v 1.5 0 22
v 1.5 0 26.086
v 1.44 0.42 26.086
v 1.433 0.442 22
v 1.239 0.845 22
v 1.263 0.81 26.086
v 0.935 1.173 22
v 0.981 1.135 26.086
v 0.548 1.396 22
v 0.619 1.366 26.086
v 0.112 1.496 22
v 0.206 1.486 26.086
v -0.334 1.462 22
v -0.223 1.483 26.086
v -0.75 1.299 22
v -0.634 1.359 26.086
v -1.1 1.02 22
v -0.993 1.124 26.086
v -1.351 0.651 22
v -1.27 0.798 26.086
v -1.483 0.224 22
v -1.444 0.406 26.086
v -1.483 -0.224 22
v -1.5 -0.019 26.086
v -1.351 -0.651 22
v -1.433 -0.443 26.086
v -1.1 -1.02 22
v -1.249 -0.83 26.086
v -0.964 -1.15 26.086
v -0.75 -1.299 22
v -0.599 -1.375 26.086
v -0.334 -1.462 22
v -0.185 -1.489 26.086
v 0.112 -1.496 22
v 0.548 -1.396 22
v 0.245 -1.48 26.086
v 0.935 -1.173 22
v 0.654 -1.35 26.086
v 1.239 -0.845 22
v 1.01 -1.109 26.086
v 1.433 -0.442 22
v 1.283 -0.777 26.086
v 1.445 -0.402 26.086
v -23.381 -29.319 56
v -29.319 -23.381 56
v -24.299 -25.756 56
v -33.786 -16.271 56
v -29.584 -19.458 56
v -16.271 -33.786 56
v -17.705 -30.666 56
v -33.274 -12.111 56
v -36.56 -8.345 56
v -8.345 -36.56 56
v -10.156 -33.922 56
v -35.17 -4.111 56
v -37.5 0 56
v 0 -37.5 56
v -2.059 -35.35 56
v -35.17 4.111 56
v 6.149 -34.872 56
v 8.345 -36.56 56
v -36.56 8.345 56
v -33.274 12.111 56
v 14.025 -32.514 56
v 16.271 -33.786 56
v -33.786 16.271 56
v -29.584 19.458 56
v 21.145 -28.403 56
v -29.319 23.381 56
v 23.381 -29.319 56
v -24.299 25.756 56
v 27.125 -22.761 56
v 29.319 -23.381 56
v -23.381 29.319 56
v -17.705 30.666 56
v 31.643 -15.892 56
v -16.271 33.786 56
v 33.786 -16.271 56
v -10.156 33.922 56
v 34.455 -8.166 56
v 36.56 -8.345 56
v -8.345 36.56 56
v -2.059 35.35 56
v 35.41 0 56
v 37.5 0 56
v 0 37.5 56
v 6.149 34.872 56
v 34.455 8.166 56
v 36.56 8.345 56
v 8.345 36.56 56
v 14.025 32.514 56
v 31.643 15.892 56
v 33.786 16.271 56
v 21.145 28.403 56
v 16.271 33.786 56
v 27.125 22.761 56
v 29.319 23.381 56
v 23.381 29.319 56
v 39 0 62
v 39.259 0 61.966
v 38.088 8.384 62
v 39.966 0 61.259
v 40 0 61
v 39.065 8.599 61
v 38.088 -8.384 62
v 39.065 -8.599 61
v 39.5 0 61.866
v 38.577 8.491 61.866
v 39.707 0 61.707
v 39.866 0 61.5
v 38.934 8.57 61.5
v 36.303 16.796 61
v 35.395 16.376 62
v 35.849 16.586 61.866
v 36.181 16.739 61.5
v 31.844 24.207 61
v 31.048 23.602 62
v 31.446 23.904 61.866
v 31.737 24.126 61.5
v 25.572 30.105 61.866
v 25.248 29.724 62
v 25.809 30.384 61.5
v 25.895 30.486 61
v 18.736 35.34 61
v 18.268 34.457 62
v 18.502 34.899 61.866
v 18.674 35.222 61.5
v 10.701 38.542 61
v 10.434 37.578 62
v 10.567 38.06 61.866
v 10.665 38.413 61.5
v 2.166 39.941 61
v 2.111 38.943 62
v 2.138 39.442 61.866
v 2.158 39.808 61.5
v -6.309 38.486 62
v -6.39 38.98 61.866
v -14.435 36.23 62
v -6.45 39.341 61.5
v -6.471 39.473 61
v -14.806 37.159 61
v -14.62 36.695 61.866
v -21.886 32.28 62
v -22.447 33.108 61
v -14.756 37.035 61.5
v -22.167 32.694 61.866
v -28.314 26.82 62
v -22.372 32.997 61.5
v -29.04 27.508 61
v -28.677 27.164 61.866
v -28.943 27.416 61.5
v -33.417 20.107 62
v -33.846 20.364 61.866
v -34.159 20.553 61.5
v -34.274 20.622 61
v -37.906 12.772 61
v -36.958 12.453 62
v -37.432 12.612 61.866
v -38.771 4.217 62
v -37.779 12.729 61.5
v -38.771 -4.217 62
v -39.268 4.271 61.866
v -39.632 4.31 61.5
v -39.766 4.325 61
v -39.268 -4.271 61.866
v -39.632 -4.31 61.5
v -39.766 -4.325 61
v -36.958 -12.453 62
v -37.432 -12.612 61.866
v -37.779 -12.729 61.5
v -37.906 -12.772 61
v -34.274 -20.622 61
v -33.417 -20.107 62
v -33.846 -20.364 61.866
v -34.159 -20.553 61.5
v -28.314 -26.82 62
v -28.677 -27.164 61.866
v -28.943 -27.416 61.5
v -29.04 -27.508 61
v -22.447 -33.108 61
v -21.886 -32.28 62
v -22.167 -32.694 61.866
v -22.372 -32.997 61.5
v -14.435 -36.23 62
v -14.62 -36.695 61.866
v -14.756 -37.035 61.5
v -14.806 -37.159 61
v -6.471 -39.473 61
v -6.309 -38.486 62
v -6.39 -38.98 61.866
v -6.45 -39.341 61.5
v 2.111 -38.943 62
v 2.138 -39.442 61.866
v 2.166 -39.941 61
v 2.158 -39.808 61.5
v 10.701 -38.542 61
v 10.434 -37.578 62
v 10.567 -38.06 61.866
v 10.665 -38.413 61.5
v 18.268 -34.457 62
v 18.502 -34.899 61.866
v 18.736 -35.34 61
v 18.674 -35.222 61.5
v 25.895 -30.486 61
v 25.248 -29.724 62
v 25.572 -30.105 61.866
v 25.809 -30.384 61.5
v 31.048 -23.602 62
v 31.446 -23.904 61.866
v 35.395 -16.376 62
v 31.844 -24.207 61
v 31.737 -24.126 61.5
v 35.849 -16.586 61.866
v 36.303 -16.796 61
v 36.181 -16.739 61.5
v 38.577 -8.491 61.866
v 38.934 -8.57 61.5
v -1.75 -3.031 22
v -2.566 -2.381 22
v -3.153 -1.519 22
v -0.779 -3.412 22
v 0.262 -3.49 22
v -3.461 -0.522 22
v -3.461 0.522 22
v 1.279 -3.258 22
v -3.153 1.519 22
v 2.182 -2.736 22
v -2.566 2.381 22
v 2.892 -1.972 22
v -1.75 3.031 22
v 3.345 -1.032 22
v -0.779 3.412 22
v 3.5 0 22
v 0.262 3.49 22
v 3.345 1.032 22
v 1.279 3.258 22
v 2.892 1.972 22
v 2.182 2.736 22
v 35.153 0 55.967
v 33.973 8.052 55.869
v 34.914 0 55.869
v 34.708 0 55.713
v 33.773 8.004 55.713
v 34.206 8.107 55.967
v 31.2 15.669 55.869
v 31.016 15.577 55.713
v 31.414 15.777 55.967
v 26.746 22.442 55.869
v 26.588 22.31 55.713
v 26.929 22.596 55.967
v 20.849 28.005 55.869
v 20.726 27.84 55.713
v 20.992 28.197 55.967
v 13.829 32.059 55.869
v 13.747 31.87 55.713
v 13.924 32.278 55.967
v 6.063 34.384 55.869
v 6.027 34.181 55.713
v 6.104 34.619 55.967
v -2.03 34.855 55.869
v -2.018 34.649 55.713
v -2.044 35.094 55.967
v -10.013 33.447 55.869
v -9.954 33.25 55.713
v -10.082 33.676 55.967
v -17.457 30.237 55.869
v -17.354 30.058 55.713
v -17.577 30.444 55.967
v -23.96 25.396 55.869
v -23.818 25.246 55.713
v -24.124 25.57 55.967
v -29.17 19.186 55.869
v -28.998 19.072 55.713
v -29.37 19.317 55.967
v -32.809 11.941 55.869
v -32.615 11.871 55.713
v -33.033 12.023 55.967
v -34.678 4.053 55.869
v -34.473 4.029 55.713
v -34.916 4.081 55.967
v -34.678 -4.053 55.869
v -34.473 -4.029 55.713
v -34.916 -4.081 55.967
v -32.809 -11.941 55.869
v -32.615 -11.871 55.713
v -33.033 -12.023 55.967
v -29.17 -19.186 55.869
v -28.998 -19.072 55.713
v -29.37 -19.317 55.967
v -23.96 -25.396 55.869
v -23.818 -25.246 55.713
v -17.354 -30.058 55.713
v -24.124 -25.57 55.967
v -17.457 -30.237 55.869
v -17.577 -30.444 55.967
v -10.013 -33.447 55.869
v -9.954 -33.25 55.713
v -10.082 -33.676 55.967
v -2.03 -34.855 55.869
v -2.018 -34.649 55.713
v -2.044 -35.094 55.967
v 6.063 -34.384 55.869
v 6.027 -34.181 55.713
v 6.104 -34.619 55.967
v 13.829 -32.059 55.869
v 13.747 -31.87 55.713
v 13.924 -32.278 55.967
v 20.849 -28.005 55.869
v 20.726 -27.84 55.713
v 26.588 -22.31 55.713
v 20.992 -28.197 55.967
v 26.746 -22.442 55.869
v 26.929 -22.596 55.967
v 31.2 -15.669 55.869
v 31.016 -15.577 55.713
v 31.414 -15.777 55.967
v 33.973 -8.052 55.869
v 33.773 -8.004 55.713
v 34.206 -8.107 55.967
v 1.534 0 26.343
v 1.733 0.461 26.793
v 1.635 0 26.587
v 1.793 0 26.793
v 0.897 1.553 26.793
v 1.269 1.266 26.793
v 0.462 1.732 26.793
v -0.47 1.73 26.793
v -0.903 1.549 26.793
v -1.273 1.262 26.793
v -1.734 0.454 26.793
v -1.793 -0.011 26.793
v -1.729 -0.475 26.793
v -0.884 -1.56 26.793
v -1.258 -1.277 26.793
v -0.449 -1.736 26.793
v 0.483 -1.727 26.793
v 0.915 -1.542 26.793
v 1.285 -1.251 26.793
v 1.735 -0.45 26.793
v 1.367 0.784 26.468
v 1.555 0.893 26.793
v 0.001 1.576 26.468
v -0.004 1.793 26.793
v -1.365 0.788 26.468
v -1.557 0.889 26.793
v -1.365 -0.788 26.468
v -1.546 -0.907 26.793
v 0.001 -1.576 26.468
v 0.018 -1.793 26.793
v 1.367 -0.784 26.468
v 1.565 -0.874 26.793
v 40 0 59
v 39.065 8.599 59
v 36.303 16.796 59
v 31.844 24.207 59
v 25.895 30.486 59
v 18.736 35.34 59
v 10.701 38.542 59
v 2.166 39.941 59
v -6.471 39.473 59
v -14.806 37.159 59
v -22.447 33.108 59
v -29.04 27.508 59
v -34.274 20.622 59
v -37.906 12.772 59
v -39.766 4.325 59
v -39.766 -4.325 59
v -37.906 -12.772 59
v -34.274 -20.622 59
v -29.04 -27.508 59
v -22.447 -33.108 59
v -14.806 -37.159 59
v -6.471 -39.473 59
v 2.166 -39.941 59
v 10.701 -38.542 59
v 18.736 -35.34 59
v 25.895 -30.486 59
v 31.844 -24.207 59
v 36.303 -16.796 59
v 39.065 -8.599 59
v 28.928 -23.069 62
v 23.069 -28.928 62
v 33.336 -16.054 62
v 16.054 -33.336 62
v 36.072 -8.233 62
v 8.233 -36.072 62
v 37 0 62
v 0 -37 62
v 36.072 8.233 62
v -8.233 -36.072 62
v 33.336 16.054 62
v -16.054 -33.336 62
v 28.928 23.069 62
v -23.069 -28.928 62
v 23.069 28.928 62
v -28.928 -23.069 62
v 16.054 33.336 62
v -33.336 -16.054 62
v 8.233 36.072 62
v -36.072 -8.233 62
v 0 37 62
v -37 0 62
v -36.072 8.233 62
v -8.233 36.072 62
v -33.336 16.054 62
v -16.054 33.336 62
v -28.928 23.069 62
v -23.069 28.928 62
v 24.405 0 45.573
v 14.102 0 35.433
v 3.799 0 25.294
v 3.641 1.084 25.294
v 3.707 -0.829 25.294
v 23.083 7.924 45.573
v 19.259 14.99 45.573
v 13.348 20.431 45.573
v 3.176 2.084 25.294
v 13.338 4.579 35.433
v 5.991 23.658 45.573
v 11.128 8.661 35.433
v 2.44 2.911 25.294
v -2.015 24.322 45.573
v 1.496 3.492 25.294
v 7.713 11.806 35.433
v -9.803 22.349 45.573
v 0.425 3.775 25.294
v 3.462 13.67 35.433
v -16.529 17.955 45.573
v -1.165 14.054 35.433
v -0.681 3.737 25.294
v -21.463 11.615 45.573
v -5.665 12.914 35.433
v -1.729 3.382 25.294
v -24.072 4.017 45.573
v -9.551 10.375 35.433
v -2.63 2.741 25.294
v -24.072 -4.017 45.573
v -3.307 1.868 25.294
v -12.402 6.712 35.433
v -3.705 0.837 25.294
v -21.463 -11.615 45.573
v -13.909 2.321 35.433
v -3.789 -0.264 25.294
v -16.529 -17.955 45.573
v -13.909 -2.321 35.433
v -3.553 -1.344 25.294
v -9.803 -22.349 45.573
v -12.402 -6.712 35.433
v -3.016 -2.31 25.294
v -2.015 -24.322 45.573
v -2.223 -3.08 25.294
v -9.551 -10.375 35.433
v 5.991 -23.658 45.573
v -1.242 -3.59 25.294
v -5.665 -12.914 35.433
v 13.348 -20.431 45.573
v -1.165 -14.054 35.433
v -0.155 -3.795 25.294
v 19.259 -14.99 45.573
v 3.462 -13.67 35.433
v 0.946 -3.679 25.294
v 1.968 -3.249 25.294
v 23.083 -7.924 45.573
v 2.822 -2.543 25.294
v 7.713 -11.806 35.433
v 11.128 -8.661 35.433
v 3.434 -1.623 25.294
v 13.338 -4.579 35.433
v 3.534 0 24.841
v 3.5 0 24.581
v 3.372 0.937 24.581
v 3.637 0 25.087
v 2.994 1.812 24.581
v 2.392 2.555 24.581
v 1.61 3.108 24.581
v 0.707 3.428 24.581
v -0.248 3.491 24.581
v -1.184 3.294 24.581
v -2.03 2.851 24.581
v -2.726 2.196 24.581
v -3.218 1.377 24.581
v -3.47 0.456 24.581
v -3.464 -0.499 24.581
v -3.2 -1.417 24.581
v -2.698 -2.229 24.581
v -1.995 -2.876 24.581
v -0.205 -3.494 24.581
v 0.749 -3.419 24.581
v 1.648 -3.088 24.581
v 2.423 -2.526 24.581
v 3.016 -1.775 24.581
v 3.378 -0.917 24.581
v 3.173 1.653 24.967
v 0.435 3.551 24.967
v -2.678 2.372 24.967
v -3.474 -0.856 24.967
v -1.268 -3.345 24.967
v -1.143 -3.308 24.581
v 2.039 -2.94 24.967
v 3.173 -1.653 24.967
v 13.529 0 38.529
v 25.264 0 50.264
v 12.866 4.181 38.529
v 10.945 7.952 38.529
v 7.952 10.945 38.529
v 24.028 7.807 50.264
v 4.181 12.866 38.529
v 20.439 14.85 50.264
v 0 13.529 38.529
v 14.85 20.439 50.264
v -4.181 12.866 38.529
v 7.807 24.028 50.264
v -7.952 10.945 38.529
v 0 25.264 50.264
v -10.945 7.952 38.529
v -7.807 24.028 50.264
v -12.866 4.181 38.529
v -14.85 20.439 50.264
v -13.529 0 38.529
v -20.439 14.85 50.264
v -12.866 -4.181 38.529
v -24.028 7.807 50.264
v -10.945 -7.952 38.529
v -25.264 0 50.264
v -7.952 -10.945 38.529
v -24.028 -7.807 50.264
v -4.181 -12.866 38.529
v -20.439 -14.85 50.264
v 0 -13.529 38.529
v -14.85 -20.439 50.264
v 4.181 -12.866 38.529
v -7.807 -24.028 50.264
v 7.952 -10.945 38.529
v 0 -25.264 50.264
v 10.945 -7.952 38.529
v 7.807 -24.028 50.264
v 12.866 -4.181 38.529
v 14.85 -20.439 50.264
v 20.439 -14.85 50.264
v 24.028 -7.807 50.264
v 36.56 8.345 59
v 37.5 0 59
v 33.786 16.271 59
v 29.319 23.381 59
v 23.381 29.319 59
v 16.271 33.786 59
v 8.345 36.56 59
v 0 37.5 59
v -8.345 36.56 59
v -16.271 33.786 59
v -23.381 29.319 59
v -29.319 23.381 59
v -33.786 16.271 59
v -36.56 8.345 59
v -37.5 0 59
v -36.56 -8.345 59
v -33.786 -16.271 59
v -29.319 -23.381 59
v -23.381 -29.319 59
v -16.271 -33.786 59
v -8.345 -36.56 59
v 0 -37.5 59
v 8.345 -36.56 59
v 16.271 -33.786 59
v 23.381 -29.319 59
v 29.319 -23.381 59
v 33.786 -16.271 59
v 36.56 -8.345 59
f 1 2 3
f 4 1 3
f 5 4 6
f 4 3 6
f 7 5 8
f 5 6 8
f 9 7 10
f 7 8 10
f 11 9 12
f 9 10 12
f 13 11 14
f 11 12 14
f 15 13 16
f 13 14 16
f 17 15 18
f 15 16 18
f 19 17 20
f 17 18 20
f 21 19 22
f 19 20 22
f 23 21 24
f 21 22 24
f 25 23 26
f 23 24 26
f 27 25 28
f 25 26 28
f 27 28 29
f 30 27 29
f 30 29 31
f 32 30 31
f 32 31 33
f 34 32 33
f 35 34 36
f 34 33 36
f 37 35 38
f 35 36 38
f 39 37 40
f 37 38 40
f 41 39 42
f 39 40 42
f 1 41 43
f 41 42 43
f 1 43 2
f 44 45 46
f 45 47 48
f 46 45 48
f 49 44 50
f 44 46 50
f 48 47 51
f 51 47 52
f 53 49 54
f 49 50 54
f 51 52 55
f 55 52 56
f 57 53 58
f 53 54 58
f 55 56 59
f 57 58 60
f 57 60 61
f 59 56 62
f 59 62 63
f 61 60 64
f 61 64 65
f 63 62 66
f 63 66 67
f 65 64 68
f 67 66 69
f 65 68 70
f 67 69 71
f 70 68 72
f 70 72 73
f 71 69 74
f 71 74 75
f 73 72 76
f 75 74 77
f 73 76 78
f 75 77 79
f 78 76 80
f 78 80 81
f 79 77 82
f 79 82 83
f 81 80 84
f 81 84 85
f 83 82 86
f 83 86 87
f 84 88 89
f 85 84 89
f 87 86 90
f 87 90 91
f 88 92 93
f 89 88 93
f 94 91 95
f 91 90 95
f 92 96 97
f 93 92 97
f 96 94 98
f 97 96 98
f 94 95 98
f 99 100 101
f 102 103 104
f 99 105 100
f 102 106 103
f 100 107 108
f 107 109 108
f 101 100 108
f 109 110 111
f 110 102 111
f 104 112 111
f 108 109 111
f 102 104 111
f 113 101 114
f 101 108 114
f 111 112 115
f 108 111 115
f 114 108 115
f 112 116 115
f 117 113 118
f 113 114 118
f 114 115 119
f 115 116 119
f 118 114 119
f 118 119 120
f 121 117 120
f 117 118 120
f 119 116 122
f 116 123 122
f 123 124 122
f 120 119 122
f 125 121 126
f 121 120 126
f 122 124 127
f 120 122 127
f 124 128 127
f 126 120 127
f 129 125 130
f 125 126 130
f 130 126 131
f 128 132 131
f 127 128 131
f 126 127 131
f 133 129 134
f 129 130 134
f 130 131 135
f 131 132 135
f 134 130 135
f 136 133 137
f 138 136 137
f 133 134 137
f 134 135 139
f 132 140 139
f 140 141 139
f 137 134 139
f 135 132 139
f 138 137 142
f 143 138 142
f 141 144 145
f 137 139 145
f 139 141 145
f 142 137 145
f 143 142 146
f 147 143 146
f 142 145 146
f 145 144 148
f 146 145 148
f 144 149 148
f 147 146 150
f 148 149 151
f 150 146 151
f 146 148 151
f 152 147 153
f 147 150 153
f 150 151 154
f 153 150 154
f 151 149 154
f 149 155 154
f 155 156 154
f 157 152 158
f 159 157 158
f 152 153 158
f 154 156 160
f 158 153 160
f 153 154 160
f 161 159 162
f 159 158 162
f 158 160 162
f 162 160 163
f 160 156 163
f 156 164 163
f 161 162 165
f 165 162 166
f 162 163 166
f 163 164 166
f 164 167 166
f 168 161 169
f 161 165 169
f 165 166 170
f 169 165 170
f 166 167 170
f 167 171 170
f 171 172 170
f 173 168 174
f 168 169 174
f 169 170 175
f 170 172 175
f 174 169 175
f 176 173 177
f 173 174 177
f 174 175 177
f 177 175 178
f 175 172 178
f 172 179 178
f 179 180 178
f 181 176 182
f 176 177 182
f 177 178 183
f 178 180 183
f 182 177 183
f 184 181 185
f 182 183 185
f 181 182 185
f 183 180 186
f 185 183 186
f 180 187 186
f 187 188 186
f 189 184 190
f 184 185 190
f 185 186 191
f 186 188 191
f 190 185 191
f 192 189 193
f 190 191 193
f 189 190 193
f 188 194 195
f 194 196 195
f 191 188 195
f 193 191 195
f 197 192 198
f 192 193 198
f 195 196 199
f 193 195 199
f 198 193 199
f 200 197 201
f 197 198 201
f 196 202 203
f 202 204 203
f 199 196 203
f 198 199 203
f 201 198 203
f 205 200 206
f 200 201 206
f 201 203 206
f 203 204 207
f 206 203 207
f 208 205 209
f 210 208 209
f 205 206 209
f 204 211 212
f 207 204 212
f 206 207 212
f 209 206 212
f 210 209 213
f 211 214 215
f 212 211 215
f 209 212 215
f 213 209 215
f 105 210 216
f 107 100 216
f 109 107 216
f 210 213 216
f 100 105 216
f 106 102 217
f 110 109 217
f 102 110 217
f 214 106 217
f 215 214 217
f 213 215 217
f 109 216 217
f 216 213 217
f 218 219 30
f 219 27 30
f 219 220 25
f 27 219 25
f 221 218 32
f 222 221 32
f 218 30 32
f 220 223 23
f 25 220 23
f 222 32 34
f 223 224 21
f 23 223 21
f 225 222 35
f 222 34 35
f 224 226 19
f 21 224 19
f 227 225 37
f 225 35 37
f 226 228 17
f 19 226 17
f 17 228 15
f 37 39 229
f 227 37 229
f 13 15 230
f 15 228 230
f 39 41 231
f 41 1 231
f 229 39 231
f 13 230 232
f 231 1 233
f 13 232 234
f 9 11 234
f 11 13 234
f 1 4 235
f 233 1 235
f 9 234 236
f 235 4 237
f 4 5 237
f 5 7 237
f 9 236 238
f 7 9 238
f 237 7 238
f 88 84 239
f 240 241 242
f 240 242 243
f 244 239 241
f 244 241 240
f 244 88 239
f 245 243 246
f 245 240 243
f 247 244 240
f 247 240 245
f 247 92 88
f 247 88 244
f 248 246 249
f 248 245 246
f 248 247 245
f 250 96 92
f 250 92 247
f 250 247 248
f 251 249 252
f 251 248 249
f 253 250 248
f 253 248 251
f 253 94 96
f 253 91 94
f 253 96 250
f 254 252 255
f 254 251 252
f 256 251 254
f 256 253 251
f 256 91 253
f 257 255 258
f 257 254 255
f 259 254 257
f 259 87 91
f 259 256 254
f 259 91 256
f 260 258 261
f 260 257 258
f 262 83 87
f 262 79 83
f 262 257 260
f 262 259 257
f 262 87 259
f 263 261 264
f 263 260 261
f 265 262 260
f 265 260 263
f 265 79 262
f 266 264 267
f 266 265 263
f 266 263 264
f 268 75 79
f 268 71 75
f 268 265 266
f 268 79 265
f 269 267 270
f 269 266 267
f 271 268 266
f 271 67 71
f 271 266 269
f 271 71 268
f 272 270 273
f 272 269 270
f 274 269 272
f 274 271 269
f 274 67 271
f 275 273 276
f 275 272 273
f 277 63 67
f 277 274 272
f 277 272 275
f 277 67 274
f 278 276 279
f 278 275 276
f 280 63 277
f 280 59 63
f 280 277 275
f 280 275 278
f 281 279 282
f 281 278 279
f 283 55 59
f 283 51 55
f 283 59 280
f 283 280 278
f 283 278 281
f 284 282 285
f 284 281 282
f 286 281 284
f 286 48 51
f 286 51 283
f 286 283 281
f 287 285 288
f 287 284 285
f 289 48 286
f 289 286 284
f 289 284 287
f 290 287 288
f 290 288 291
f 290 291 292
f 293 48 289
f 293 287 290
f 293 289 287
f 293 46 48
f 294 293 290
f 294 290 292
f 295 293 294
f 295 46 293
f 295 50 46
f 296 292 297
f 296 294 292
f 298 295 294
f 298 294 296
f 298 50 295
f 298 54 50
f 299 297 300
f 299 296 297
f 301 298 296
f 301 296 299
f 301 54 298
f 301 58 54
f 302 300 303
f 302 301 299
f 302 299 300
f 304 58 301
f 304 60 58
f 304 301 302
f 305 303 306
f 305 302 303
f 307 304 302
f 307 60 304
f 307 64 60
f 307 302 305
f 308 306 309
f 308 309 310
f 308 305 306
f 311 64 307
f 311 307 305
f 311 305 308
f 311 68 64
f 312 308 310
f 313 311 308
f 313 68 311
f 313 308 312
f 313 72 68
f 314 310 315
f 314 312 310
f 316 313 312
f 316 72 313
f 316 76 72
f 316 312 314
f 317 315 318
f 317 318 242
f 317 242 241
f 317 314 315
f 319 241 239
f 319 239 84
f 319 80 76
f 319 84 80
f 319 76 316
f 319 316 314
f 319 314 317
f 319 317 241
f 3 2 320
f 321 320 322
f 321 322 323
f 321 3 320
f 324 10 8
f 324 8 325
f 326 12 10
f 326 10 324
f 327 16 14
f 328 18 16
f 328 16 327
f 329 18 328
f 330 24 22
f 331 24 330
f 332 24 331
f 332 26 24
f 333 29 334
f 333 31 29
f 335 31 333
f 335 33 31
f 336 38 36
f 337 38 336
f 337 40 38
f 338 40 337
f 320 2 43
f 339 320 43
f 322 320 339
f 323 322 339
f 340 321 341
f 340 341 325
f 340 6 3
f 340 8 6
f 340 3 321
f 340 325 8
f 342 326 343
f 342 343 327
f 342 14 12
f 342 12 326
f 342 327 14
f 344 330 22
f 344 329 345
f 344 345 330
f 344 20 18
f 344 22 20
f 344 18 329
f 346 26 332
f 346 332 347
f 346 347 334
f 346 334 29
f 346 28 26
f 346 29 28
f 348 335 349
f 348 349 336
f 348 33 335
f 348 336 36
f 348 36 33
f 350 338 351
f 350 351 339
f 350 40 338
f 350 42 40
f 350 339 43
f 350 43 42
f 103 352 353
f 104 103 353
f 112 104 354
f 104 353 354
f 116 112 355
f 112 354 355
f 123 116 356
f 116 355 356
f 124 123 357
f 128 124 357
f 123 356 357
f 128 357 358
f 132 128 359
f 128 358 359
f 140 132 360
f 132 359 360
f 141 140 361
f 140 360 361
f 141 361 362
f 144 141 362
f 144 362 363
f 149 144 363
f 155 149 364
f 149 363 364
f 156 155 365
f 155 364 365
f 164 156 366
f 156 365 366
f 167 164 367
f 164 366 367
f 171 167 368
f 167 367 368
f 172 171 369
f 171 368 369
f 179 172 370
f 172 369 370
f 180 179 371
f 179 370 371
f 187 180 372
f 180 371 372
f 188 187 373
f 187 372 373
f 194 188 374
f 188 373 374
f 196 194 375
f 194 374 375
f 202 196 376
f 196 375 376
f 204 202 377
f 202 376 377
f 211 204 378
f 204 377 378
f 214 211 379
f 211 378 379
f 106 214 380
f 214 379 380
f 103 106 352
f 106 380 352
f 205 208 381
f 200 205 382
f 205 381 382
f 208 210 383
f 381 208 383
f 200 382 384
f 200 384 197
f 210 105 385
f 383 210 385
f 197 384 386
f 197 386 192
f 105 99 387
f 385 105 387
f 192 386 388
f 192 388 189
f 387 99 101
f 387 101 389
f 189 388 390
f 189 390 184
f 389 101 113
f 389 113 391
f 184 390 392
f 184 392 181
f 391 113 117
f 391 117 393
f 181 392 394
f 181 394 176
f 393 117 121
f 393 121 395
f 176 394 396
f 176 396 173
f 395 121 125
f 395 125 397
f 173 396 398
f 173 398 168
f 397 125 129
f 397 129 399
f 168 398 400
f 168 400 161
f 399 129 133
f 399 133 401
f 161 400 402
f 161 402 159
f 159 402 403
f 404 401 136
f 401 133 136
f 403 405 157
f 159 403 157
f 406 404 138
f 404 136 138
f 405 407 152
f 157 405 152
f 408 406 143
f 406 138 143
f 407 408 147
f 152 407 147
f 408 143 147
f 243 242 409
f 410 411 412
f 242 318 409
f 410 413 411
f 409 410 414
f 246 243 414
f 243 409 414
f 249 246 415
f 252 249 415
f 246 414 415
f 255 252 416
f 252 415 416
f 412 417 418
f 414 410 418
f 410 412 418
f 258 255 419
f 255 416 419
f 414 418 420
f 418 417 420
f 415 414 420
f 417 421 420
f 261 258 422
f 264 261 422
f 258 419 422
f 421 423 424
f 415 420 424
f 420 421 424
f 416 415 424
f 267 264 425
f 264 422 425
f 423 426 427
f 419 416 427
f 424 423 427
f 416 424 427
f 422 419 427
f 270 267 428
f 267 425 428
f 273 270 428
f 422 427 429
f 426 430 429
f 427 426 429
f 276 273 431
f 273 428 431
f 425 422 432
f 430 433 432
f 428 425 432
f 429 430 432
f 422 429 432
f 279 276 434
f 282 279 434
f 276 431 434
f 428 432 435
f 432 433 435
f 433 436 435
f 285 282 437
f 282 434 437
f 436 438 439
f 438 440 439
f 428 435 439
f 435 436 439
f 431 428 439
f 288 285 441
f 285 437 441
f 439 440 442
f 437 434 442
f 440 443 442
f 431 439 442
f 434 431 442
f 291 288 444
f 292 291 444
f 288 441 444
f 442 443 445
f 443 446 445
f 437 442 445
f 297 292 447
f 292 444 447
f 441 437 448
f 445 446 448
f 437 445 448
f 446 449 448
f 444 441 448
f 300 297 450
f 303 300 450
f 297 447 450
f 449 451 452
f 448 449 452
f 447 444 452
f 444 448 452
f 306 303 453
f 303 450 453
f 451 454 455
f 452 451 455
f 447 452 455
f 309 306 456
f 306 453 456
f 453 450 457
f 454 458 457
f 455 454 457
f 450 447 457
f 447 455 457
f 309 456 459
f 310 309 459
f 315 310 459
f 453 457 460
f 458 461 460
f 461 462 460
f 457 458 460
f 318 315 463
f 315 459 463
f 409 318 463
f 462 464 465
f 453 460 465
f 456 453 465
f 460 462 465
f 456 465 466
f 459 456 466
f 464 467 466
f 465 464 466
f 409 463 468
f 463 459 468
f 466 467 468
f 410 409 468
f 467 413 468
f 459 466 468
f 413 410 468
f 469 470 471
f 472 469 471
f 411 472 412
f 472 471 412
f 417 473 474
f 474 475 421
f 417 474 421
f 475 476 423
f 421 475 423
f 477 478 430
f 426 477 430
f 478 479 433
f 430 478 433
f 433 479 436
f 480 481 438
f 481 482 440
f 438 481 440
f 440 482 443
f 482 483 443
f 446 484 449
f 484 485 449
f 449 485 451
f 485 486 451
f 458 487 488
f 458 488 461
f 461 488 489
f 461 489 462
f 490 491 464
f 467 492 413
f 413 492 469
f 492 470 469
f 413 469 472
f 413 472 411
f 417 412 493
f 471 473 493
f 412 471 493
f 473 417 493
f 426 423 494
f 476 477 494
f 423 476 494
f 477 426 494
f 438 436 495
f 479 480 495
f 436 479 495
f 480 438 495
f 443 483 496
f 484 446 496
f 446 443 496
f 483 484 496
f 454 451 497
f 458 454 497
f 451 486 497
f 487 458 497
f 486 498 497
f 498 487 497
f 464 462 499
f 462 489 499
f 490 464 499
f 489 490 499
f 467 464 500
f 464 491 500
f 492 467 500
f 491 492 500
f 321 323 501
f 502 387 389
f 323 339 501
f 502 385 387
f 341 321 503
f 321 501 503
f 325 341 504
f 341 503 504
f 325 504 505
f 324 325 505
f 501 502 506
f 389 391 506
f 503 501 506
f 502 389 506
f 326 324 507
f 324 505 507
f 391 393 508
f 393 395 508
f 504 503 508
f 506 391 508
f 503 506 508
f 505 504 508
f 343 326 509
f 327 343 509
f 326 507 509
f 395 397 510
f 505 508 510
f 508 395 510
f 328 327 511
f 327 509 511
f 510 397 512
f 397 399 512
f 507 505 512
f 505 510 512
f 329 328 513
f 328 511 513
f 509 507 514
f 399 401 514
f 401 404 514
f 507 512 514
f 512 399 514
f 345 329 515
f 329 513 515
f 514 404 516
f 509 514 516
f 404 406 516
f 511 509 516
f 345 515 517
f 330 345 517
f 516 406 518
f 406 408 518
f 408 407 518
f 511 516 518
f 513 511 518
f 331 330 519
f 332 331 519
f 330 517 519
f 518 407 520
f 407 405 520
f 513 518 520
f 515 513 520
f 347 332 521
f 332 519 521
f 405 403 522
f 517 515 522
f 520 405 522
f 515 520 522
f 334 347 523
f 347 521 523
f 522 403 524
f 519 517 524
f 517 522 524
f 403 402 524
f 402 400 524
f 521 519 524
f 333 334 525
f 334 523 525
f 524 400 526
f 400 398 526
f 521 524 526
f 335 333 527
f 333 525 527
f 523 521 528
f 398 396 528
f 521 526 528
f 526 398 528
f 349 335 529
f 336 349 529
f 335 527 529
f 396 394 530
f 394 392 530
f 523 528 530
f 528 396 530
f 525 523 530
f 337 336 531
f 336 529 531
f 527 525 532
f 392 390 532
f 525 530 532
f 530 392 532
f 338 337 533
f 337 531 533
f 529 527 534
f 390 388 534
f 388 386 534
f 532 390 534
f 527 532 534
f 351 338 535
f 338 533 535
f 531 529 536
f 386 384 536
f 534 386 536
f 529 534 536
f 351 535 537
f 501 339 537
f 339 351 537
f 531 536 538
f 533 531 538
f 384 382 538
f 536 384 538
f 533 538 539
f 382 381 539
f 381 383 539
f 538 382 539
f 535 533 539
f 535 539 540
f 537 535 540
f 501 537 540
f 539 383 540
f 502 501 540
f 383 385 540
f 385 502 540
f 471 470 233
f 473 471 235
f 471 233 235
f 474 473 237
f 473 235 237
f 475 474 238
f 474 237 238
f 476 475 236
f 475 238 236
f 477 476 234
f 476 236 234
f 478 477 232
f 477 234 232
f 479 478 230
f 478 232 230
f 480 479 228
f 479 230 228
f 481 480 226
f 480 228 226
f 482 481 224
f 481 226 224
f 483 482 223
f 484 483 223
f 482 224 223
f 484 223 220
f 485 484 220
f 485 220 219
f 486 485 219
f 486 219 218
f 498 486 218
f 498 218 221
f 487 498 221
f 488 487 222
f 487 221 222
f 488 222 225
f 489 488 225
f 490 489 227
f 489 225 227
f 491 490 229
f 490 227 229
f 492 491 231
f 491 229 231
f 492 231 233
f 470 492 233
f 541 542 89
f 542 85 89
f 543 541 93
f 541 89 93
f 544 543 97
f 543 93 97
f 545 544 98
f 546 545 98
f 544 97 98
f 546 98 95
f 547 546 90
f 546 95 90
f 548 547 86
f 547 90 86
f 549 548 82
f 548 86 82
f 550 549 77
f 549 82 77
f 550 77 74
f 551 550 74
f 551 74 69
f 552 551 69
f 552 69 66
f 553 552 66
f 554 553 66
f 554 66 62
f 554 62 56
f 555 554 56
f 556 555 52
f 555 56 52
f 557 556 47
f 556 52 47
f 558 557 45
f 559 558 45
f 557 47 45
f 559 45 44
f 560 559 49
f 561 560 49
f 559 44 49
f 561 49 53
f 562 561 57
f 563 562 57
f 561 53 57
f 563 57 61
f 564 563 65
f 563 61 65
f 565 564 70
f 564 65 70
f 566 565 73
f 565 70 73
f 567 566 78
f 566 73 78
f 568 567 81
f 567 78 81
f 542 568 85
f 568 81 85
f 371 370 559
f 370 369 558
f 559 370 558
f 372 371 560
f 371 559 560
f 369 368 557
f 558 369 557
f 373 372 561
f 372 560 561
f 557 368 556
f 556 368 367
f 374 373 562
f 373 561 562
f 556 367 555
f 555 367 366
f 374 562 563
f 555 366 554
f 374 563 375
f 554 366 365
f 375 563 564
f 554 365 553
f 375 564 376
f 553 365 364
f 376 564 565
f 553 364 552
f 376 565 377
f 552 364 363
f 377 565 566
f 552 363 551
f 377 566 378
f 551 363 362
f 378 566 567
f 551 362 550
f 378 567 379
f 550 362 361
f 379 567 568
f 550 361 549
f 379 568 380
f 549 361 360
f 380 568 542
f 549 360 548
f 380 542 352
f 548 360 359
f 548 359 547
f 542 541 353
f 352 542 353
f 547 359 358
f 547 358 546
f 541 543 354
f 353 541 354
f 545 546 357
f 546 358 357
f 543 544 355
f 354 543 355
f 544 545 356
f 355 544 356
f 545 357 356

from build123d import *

# Parameters (mm, degrees)
FILLET009_R = 1
FILLET010_R = 1
FILLET011_R = 1
FILLET012_R = 1


with BuildPart() as part:
    # Sketch044 → Revolution (revolve)
    with BuildSketch(Plane.XZ):
        Polygon((40, 61), (40, 58), (37.5, 58), (37.5, 55), (35, 55), (3.5, 24), (3.5, 21), (1.5, 21), (1.5, 25.5), (37, 61), align=None)
    revolve(axis=Axis((0, 0, 0), (0, 0, 1)))

    # Fillet009
    fillet009_edges = [part.edges().sort_by_distance(p)[0] for p in [
        (-1.5, 0, 25.5),
    ]]
    fillet(fillet009_edges, radius=FILLET009_R)

    # Fillet010
    fillet010_edges = [part.edges().sort_by_distance(p)[0] for p in [
        (-40, 0, 61),
    ]]
    fillet(fillet010_edges, radius=FILLET010_R)

    # Fillet011
    fillet011_edges = [part.edges().sort_by_distance(p)[0] for p in [
        (-3.5, 0, 24),
    ]]
    fillet(fillet011_edges, radius=FILLET011_R)

    # Fillet012
    fillet012_edges = [part.edges().sort_by_distance(p)[0] for p in [
        (-35, 0, 55),
    ]]
    fillet(fillet012_edges, radius=FILLET012_R)


with BuildPart() as part_1:
    # Body006 placement: moved
    add(part.part.moved(Location((0, 0, 1))))


solid = part_1.part
